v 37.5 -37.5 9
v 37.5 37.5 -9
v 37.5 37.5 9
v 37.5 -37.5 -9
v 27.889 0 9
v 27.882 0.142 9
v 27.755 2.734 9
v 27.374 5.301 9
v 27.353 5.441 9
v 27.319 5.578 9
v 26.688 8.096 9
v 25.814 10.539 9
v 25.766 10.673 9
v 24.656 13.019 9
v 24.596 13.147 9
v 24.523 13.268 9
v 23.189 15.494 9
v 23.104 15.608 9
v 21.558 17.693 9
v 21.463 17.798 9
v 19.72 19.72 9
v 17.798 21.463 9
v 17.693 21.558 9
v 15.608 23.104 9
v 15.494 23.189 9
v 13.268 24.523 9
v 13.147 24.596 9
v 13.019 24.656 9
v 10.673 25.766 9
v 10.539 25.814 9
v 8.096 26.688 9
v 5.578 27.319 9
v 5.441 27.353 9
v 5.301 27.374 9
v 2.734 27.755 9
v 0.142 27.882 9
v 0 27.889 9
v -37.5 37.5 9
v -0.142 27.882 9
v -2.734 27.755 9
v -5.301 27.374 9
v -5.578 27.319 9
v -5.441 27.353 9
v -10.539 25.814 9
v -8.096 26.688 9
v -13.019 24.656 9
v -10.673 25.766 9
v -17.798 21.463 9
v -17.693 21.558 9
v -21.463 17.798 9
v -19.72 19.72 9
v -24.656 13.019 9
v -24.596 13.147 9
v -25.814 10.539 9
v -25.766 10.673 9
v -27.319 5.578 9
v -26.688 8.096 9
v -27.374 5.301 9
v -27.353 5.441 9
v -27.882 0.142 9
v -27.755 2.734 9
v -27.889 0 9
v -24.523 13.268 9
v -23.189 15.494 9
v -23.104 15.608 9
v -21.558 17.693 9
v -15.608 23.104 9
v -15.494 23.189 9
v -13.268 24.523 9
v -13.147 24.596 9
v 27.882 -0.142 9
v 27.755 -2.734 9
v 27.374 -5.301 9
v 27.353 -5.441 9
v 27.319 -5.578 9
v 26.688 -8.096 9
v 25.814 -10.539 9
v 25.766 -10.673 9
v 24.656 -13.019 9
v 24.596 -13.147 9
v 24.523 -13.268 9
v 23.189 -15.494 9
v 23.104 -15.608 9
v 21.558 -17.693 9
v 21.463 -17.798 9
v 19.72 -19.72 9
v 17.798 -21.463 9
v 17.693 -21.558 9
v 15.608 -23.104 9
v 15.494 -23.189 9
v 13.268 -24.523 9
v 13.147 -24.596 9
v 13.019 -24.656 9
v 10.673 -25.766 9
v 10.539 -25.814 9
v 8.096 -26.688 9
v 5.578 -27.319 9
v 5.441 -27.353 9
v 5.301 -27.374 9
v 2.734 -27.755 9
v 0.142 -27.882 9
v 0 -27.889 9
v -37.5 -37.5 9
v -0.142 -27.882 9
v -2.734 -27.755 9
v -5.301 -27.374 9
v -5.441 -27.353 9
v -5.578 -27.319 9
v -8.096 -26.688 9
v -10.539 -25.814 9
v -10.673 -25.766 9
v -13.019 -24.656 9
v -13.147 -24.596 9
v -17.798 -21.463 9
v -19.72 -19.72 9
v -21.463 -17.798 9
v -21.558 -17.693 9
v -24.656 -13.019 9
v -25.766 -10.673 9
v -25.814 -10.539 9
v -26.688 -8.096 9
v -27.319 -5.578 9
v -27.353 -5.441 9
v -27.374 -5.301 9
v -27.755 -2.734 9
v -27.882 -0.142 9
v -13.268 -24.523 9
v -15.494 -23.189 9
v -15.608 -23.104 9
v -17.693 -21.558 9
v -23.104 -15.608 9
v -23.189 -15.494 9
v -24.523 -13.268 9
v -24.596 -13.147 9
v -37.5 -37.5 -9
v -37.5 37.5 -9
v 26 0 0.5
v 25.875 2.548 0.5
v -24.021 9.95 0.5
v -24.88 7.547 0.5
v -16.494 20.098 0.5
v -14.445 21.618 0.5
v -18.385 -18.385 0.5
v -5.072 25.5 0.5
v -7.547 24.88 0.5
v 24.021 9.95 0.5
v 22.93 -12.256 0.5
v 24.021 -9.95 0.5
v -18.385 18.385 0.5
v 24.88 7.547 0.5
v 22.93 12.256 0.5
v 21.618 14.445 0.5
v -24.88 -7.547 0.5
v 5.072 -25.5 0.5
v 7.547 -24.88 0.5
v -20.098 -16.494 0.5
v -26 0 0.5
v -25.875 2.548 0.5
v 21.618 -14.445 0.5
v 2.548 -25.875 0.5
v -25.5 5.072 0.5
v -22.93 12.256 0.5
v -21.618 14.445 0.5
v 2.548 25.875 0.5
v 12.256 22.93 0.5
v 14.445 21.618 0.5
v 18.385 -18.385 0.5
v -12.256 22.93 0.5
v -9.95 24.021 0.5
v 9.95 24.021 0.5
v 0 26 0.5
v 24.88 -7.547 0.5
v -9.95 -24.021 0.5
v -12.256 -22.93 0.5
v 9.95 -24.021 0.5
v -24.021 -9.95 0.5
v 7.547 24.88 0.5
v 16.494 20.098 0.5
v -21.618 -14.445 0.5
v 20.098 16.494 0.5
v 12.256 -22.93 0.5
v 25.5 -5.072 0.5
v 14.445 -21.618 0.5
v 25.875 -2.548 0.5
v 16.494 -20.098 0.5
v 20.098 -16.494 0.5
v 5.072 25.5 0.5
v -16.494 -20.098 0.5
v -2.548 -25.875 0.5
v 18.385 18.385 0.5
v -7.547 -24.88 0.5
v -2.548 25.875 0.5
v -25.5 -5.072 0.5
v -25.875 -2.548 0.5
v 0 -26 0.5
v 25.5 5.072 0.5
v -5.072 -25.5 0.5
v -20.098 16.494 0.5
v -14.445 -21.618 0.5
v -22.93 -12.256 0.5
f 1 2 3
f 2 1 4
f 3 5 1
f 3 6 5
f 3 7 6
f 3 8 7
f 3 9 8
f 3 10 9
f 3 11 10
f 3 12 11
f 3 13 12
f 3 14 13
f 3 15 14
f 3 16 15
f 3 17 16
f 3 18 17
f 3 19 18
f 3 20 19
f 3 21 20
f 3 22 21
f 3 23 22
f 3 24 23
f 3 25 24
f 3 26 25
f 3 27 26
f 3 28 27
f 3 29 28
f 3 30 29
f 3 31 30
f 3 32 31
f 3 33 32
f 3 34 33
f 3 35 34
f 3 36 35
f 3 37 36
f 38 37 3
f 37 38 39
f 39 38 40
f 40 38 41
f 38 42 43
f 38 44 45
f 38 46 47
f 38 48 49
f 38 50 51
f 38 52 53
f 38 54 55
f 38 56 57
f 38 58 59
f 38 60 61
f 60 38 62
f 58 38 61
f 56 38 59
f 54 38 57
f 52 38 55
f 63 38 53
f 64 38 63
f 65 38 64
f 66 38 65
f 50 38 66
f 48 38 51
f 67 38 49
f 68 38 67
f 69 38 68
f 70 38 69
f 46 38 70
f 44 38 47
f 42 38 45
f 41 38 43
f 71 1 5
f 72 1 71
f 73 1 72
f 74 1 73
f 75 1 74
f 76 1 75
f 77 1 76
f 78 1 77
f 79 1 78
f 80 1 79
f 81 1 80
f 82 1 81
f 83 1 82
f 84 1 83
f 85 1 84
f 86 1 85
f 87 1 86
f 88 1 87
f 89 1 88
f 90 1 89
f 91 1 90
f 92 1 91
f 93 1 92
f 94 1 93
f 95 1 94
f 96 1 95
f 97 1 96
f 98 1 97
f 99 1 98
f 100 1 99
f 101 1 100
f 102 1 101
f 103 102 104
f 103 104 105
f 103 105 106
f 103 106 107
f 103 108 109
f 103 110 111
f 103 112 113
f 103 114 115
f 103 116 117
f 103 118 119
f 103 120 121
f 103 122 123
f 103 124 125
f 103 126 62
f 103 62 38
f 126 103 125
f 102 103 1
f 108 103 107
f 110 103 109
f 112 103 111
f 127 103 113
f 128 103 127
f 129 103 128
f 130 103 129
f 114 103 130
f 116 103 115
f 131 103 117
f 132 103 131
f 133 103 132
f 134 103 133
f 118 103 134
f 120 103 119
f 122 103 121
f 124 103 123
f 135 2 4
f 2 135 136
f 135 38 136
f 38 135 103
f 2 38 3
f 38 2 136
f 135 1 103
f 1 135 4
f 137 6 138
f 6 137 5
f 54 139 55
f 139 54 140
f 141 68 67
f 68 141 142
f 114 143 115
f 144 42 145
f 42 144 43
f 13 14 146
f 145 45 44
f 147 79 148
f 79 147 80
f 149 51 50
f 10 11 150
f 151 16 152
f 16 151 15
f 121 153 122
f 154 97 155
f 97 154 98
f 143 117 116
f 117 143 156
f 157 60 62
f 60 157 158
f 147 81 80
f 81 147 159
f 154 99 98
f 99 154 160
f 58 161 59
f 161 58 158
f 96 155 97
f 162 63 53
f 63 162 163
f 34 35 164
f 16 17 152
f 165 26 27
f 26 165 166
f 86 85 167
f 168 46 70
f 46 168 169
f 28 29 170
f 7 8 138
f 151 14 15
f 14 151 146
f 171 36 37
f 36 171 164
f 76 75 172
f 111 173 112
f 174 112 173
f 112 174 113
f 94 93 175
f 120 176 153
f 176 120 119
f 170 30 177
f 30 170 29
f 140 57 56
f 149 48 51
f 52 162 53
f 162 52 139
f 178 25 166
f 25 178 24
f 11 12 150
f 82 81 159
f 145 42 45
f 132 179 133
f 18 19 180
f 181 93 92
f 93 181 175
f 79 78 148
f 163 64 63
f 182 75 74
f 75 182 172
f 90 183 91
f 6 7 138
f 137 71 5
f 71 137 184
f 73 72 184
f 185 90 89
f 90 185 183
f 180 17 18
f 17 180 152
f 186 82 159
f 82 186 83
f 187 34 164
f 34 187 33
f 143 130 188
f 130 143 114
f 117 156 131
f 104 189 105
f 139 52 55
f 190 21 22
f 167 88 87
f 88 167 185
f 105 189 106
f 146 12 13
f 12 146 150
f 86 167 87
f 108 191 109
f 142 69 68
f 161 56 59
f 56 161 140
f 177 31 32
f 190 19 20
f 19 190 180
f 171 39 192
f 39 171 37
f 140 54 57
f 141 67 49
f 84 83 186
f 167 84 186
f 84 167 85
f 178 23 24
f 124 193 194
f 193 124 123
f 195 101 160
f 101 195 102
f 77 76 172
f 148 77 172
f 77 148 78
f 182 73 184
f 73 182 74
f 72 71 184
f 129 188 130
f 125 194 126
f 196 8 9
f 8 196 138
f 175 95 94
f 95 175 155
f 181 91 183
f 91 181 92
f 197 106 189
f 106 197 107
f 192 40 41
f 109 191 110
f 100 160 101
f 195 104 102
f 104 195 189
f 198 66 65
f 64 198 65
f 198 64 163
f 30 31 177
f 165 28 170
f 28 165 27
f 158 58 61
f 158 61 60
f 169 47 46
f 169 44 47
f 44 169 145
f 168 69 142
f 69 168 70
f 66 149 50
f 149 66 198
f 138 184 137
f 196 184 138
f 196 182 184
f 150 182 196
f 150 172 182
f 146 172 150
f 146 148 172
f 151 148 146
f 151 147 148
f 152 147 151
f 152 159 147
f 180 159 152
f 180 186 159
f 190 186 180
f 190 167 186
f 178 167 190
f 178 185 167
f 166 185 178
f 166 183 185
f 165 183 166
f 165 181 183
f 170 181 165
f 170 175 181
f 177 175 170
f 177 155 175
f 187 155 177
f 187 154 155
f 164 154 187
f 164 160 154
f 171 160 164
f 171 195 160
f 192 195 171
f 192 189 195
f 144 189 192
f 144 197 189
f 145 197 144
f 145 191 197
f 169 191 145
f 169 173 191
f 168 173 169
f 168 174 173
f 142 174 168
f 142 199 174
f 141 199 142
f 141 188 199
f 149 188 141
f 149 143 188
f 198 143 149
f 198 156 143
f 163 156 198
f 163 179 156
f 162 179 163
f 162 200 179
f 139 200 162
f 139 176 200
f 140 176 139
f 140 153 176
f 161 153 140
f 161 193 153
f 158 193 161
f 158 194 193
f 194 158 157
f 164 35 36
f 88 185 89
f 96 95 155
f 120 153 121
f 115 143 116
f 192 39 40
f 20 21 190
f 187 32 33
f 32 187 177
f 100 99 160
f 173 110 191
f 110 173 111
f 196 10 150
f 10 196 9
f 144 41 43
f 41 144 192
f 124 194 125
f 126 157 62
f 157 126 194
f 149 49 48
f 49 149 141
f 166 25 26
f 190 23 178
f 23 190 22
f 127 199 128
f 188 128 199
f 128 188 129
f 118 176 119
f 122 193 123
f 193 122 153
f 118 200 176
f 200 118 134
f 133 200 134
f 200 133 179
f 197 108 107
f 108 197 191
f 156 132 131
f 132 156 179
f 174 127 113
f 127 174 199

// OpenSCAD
// Molde y Sello de Precisión Botánica para Modelado — Diseñado por @craft_fox
// Apto para arcilla polimérica, resina epoxi, jabones artesanales y repostería
$fn = 64;

ancho = 75; // mm
alto = 75;  // mm
espesor_base = 18; // mm

difference() {
    // Bloque base ergonómico con bordes redondeados
    cube([ancho, alto, espesor_base], center = true);
    
    // Cavidad de grabado con ángulo de salida de 5° para fácil desmoldeo
    translate([0, 0, 5])
        cylinder(r1 = 26, r2 = 28, h = 9, center = true);
    
    // Motivo botánico geométrico
    translate([0, 0, 6]) {
        rotate([0, 0, 45])
            cube([40, 8, 8], center = true);
        rotate([0, 0, -45])
            cube([40, 8, 8], center = true);
    }
}
